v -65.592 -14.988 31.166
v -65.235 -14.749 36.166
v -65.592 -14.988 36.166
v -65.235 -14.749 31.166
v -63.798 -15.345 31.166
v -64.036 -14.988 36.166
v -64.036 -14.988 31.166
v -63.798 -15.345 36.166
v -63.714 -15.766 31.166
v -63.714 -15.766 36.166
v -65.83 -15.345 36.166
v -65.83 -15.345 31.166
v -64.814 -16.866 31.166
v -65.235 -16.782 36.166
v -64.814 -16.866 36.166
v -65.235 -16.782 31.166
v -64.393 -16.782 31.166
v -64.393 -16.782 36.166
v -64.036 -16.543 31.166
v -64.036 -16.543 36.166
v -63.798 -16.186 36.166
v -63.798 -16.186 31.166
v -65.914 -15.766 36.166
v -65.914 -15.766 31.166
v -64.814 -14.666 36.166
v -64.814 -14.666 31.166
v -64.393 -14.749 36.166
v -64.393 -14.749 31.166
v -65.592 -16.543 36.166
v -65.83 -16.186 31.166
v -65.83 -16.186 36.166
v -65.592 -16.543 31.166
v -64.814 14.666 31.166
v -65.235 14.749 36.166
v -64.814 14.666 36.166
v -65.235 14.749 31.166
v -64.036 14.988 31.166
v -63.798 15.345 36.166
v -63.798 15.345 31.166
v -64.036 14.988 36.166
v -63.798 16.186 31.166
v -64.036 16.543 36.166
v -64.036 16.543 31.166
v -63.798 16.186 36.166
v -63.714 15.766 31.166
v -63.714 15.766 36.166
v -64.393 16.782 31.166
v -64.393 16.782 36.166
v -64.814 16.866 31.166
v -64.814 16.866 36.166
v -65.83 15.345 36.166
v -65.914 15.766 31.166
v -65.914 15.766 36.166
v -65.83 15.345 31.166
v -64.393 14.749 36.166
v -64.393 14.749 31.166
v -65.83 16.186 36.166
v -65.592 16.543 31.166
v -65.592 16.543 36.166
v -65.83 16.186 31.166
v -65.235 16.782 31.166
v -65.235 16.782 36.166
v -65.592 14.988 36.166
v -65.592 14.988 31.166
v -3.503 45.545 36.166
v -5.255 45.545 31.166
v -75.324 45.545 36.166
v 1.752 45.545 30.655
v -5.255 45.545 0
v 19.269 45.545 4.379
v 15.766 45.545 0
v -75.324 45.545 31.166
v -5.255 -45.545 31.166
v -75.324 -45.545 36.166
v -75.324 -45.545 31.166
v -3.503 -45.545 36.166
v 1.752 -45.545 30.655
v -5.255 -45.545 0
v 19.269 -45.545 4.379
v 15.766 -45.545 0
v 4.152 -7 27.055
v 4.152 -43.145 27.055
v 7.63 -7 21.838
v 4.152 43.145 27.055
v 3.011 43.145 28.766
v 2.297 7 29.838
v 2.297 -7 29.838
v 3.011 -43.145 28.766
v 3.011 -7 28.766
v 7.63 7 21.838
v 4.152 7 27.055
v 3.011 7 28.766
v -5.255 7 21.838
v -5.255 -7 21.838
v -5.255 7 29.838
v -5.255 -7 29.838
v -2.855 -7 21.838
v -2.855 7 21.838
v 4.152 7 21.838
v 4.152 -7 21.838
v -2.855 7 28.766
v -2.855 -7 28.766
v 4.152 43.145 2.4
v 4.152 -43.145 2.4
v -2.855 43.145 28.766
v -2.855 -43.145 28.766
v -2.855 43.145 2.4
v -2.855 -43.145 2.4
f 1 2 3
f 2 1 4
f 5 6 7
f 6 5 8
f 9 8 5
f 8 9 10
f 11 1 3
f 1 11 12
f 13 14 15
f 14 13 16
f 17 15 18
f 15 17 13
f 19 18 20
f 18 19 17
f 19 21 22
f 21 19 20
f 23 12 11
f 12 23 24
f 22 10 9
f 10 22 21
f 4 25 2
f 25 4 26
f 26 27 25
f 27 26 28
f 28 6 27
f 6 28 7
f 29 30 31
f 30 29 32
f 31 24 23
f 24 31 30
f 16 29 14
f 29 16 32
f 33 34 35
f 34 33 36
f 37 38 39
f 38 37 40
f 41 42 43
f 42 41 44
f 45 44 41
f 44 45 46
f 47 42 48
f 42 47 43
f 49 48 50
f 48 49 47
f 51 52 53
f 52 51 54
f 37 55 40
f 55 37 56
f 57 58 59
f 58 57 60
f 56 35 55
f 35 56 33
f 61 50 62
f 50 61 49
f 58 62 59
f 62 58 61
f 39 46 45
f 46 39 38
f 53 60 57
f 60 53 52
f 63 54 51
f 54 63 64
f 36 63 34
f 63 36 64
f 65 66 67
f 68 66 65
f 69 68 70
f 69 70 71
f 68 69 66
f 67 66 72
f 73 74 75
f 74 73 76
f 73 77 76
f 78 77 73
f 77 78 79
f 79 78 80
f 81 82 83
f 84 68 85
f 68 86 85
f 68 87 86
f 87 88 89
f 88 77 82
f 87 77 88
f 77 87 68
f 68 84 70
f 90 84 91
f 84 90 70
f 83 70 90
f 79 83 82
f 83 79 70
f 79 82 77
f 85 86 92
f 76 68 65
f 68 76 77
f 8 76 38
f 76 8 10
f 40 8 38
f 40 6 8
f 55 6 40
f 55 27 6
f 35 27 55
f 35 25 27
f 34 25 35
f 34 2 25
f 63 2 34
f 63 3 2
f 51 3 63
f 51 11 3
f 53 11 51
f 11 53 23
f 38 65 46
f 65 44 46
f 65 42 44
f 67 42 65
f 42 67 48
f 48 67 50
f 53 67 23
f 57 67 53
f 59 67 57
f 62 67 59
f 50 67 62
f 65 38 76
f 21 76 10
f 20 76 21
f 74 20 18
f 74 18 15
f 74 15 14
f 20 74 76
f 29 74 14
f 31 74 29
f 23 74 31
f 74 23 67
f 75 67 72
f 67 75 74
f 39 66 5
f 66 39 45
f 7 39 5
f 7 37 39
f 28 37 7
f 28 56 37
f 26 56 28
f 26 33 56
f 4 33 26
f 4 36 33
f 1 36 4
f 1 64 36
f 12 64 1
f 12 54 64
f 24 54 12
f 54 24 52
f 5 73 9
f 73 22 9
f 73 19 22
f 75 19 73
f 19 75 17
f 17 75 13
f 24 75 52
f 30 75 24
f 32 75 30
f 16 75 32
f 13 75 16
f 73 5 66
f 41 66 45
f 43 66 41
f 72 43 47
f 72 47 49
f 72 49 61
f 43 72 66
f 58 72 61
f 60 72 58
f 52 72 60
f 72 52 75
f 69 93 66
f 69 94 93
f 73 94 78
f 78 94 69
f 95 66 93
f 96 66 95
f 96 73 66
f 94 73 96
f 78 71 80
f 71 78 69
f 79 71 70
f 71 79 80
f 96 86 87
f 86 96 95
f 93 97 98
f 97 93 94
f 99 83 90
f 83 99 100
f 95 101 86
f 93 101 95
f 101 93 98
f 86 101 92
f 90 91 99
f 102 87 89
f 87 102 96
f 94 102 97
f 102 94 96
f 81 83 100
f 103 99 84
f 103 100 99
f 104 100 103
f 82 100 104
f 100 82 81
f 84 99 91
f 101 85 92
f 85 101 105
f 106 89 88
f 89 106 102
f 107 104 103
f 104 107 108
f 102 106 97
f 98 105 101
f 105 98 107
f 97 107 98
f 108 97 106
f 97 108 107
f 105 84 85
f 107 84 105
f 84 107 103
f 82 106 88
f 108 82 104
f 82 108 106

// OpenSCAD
// file: ../../library/e7_all.scad
// ==========================================================================
//  e7_all.scad - include this one file. Preview, print plates and the report.
// ==========================================================================
include <e7_params.scad>
include <e7_body.scad>

// whole painted loco
module e7_preview() {
  // carbody in its paint bands
  for (i = [0:len(PAINT_BANDS) - 1]) {
    z0 = i == 0 ? -1 : p(PAINT_BANDS[i - 1][0]);
    z1 = i == len(PAINT_BANDS) - 1 ? 1000 : p(PAINT_BANDS[i][0]);
    color(PAINT_BANDS[i][1]) render(convexity = 8) e7_shell_solid([z0, z1]);
  }
  color(C_GLASS) e7_glass();
  color(C_LENS) let (d = nose_d_at_z(HEADLIGHT[0]))
    translate([XF - p(d) + p(HEADLIGHT[2]) + p(1.5), 0, p(HEADLIGHT[0])]) rotate([0, 90, 0]) cylinder(d = p(HEADLIGHT[1]) - 0.8, h = 0.5, $fn = 32);
  color(C_FRAME) { for (j = [1:NFRAME]) e7_frame_piece(j); e7_pilot(); e7_pilot_rear(); }
  for (tx = [TRK_X, -TRK_X]) translate([tx, 0, 0]) { color(C_TRUCK) e7_truck_frame(); color(C_WHEEL) e7_wheels(); }
}
// thin glass panes sitting in the window pockets (preview only)
module e7_glass() {
  intersection() { e7_loft(DET * 0.6); union() { e7_windshield_cut(); e7_side_cuts_windows_only(); } }
}
module e7_side_cuts_windows_only() {
  for (s = [-1, 1], w = CAB_WIN)
    translate([XF - p(w[1]), s * HW - (s > 0 ? DET : 3 - DET), p(w[2])]) cube([p(w[1] - w[0]), 3, p(w[3] - w[2])]);
}

// one print, laid out for the printer
module e7_plate(part) {
  sec = [for (k = [1:NSEC]) str("body_", k)];
  frm = [for (j = [1:NFRAME]) str("frame_", j)];
  if (is_num(search([part], sec)[0])) {
    k = search([part], sec)[0] + 1;
    // stand the section on its open bottom (skirt edge on the bed)
    translate([-sec_x0(k) - SEC_L / 2, 0, -Z_SKIRT]) e7_body_section(k);
  } else if (is_num(search([part], frm)[0])) {
    j = search([part], frm)[0] + 1;
    xs = concat([FRAME_X0], FRAME_SPLITS, [FRAME_X1]);
    translate([-(xs[j - 1] + xs[j]) / 2, 0, -Z_FRAME_BOT]) e7_frame_piece(j);
  } else if (part == "pilot") {
    translate([-XF, 0, 0]) rotate([0, 0, 0]) translate([0, 0, -p(5)]) e7_pilot();
  } else if (part == "pilot_rear") {
    translate([-XR, 0, 0]) translate([0, 0, -(CPL_Z - CPL_H / 2 - WALL)]) e7_pilot_rear();
  } else if (part == "truck") {
    // upside down, bolster on the bed
    translate([0, 0, Z_FRAME_BOT - 0.3]) rotate([180, 0, 0]) e7_truck_frame();
  } else {
    assert(false, str("unknown part '", part, "'"));
  }
}

module e7_report() {
  echo(str("MILW E7A ", ROAD_NO, " class ", CLASS, " - ", SC, " scale 1:", RATIO, ", paint ", PAINT));
  echo(str("  carbody ", round(BL), " mm long, ", round(2 * HW), " mm wide, roof ", round(Z_ROOF), " mm, cab ", round(Z_CAB), " mm above rail"));
  echo(str("  ", NSEC, " body sections of ", round(SEC_L), " mm; ", NFRAME, " frame pieces; trucks at +/- ", round(TRK_X), " mm"));
  echo(str("  body screws ", SCREW_BODY_NAME, " x ", 2 * len(BOSS_X), "; truck pivots ", PIVOT[1], "; wheels ", round(WHEEL_D * 10) / 10, " mm (bought)"));
}
// main file
// Milwaukee Road E7A, G scale 1-29 - print 10 of 12: pilot - front pilot with coupler pocket
// Render (F6), export STL, print. Settings: ../../library/e7_params.scad
// Whole loco preview and notes: ../../MILW_E7_Main.scad
SCALE_SEL = "G";
include <../../library/e7_all.scad>
e7_plate("pilot");
